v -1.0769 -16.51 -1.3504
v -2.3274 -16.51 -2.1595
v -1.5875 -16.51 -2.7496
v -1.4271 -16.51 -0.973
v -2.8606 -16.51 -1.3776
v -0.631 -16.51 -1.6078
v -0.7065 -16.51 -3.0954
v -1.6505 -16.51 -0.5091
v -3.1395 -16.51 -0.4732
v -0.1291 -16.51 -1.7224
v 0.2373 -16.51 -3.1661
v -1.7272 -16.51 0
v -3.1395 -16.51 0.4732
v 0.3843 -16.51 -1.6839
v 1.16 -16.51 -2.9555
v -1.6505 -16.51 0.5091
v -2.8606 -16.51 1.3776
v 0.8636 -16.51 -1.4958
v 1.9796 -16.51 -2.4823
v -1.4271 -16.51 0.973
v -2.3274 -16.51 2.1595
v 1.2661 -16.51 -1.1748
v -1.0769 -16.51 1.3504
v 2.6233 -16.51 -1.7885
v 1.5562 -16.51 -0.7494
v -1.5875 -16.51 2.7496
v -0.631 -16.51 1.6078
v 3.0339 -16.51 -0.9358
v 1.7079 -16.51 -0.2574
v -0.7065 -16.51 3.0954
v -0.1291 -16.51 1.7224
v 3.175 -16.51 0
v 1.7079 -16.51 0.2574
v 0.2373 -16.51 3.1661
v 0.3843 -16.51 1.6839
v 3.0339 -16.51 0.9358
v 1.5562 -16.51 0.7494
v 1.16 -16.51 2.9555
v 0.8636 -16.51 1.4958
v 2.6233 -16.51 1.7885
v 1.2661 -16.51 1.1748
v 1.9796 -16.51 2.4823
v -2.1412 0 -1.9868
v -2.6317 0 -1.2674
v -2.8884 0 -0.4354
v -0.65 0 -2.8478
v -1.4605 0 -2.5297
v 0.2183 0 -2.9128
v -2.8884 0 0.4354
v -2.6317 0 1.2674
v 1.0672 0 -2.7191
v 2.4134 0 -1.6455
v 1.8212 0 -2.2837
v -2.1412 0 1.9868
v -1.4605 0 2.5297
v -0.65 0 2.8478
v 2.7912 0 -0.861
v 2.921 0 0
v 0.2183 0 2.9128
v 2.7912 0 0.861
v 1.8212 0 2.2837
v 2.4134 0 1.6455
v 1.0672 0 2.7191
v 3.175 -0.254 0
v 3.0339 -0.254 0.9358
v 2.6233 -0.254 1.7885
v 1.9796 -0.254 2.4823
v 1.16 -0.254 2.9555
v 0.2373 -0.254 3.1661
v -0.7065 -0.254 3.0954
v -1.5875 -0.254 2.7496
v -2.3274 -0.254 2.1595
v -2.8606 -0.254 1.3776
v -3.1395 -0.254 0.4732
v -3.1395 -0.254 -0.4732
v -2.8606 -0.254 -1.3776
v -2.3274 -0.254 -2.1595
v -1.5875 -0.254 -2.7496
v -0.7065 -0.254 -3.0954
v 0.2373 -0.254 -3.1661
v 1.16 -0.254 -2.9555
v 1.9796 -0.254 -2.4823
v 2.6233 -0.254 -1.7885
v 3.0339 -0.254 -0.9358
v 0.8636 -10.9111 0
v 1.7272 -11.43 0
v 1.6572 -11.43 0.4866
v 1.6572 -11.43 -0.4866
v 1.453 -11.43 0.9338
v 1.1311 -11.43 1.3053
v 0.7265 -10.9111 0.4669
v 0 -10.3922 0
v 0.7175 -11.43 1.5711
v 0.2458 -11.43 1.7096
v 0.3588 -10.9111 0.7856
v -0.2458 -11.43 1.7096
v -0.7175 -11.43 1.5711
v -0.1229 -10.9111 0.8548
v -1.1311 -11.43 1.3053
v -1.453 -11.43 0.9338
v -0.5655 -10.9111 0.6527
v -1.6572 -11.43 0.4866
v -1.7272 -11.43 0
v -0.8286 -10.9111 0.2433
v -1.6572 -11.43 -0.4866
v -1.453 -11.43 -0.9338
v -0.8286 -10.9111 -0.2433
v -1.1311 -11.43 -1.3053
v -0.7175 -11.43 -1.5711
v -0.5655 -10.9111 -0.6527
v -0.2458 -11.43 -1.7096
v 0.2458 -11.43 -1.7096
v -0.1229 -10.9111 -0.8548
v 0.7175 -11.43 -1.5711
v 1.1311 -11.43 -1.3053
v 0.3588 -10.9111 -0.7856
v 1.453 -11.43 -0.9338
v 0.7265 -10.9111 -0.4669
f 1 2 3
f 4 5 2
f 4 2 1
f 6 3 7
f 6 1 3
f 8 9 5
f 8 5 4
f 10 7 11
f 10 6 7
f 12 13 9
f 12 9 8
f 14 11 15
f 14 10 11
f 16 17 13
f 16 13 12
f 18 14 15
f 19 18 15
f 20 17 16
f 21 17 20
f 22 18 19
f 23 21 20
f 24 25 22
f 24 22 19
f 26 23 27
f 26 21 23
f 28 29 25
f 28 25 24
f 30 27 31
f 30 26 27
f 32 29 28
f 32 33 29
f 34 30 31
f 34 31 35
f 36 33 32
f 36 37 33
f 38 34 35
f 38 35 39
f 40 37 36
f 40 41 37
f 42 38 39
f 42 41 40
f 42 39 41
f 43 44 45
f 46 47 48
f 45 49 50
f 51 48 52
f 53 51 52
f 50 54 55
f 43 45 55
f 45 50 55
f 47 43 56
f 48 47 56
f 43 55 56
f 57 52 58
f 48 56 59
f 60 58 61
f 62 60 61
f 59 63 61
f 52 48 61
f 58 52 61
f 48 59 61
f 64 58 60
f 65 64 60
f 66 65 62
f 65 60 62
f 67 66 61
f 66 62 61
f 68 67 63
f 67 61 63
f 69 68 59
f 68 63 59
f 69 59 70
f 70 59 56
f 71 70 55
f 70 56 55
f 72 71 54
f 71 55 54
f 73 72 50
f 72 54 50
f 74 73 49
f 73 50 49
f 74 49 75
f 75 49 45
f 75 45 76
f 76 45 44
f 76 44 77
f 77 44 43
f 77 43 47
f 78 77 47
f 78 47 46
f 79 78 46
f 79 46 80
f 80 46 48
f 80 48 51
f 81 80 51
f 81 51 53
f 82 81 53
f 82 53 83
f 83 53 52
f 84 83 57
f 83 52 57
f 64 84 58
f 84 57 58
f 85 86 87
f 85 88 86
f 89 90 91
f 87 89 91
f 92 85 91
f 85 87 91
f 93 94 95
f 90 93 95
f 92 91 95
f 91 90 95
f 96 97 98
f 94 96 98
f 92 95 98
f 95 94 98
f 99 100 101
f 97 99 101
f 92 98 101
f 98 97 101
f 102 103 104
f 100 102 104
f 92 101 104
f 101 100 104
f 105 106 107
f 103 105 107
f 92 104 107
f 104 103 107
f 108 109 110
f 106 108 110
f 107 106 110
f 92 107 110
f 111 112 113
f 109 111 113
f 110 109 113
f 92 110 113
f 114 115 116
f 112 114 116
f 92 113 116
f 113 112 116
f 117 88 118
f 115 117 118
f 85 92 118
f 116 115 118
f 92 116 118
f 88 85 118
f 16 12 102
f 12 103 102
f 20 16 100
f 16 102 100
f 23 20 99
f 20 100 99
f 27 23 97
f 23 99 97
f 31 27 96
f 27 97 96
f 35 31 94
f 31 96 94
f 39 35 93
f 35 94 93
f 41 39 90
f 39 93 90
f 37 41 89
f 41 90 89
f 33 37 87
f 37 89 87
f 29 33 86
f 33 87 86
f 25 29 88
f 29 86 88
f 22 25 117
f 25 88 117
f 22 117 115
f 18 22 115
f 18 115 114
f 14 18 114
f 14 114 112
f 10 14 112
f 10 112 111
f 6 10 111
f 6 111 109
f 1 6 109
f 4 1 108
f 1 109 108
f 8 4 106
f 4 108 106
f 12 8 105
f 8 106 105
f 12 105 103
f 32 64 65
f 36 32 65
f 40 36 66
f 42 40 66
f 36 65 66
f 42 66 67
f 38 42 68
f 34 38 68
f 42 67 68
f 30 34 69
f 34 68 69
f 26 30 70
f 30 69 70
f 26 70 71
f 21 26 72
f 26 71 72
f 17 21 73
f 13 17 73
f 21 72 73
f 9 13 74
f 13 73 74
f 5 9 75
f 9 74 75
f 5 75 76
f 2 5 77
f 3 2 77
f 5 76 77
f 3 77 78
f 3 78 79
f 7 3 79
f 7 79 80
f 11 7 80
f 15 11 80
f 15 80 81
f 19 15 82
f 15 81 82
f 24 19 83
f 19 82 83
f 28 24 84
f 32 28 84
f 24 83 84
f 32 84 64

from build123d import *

# Parameters (mm, degrees)
F0_R     = 3.175
F1_DEPTH = 16.51
F3_D     = 3.4544
F3_DEPTH = 5.08
F3_TIP   = 1.0378064612
F4_SIZE  = 0.254


with BuildPart() as f1:
    # F0 (on Front) → F1 (new body)
    with BuildSketch(Plane.XZ):
        Circle(F0_R)
    extrude(amount=F1_DEPTH)

    # F3
    with Locations(Plane.XZ.offset(16.51)):
        with Locations((0, 0)):
            Hole(F3_D / 2, depth=F3_DEPTH)
            with Locations((0, 0, -(F3_DEPTH + F3_TIP / 2))):  # 118° drill point
                Cone(0, F3_D / 2, F3_TIP, mode=Mode.SUBTRACT)

    # F4
    f4_edges = [f1.edges().sort_by_distance(p)[0] for p in [
        (-3.175, 0, 0),
    ]]
    chamfer(f4_edges, length=F4_SIZE)


solid = f1.part
